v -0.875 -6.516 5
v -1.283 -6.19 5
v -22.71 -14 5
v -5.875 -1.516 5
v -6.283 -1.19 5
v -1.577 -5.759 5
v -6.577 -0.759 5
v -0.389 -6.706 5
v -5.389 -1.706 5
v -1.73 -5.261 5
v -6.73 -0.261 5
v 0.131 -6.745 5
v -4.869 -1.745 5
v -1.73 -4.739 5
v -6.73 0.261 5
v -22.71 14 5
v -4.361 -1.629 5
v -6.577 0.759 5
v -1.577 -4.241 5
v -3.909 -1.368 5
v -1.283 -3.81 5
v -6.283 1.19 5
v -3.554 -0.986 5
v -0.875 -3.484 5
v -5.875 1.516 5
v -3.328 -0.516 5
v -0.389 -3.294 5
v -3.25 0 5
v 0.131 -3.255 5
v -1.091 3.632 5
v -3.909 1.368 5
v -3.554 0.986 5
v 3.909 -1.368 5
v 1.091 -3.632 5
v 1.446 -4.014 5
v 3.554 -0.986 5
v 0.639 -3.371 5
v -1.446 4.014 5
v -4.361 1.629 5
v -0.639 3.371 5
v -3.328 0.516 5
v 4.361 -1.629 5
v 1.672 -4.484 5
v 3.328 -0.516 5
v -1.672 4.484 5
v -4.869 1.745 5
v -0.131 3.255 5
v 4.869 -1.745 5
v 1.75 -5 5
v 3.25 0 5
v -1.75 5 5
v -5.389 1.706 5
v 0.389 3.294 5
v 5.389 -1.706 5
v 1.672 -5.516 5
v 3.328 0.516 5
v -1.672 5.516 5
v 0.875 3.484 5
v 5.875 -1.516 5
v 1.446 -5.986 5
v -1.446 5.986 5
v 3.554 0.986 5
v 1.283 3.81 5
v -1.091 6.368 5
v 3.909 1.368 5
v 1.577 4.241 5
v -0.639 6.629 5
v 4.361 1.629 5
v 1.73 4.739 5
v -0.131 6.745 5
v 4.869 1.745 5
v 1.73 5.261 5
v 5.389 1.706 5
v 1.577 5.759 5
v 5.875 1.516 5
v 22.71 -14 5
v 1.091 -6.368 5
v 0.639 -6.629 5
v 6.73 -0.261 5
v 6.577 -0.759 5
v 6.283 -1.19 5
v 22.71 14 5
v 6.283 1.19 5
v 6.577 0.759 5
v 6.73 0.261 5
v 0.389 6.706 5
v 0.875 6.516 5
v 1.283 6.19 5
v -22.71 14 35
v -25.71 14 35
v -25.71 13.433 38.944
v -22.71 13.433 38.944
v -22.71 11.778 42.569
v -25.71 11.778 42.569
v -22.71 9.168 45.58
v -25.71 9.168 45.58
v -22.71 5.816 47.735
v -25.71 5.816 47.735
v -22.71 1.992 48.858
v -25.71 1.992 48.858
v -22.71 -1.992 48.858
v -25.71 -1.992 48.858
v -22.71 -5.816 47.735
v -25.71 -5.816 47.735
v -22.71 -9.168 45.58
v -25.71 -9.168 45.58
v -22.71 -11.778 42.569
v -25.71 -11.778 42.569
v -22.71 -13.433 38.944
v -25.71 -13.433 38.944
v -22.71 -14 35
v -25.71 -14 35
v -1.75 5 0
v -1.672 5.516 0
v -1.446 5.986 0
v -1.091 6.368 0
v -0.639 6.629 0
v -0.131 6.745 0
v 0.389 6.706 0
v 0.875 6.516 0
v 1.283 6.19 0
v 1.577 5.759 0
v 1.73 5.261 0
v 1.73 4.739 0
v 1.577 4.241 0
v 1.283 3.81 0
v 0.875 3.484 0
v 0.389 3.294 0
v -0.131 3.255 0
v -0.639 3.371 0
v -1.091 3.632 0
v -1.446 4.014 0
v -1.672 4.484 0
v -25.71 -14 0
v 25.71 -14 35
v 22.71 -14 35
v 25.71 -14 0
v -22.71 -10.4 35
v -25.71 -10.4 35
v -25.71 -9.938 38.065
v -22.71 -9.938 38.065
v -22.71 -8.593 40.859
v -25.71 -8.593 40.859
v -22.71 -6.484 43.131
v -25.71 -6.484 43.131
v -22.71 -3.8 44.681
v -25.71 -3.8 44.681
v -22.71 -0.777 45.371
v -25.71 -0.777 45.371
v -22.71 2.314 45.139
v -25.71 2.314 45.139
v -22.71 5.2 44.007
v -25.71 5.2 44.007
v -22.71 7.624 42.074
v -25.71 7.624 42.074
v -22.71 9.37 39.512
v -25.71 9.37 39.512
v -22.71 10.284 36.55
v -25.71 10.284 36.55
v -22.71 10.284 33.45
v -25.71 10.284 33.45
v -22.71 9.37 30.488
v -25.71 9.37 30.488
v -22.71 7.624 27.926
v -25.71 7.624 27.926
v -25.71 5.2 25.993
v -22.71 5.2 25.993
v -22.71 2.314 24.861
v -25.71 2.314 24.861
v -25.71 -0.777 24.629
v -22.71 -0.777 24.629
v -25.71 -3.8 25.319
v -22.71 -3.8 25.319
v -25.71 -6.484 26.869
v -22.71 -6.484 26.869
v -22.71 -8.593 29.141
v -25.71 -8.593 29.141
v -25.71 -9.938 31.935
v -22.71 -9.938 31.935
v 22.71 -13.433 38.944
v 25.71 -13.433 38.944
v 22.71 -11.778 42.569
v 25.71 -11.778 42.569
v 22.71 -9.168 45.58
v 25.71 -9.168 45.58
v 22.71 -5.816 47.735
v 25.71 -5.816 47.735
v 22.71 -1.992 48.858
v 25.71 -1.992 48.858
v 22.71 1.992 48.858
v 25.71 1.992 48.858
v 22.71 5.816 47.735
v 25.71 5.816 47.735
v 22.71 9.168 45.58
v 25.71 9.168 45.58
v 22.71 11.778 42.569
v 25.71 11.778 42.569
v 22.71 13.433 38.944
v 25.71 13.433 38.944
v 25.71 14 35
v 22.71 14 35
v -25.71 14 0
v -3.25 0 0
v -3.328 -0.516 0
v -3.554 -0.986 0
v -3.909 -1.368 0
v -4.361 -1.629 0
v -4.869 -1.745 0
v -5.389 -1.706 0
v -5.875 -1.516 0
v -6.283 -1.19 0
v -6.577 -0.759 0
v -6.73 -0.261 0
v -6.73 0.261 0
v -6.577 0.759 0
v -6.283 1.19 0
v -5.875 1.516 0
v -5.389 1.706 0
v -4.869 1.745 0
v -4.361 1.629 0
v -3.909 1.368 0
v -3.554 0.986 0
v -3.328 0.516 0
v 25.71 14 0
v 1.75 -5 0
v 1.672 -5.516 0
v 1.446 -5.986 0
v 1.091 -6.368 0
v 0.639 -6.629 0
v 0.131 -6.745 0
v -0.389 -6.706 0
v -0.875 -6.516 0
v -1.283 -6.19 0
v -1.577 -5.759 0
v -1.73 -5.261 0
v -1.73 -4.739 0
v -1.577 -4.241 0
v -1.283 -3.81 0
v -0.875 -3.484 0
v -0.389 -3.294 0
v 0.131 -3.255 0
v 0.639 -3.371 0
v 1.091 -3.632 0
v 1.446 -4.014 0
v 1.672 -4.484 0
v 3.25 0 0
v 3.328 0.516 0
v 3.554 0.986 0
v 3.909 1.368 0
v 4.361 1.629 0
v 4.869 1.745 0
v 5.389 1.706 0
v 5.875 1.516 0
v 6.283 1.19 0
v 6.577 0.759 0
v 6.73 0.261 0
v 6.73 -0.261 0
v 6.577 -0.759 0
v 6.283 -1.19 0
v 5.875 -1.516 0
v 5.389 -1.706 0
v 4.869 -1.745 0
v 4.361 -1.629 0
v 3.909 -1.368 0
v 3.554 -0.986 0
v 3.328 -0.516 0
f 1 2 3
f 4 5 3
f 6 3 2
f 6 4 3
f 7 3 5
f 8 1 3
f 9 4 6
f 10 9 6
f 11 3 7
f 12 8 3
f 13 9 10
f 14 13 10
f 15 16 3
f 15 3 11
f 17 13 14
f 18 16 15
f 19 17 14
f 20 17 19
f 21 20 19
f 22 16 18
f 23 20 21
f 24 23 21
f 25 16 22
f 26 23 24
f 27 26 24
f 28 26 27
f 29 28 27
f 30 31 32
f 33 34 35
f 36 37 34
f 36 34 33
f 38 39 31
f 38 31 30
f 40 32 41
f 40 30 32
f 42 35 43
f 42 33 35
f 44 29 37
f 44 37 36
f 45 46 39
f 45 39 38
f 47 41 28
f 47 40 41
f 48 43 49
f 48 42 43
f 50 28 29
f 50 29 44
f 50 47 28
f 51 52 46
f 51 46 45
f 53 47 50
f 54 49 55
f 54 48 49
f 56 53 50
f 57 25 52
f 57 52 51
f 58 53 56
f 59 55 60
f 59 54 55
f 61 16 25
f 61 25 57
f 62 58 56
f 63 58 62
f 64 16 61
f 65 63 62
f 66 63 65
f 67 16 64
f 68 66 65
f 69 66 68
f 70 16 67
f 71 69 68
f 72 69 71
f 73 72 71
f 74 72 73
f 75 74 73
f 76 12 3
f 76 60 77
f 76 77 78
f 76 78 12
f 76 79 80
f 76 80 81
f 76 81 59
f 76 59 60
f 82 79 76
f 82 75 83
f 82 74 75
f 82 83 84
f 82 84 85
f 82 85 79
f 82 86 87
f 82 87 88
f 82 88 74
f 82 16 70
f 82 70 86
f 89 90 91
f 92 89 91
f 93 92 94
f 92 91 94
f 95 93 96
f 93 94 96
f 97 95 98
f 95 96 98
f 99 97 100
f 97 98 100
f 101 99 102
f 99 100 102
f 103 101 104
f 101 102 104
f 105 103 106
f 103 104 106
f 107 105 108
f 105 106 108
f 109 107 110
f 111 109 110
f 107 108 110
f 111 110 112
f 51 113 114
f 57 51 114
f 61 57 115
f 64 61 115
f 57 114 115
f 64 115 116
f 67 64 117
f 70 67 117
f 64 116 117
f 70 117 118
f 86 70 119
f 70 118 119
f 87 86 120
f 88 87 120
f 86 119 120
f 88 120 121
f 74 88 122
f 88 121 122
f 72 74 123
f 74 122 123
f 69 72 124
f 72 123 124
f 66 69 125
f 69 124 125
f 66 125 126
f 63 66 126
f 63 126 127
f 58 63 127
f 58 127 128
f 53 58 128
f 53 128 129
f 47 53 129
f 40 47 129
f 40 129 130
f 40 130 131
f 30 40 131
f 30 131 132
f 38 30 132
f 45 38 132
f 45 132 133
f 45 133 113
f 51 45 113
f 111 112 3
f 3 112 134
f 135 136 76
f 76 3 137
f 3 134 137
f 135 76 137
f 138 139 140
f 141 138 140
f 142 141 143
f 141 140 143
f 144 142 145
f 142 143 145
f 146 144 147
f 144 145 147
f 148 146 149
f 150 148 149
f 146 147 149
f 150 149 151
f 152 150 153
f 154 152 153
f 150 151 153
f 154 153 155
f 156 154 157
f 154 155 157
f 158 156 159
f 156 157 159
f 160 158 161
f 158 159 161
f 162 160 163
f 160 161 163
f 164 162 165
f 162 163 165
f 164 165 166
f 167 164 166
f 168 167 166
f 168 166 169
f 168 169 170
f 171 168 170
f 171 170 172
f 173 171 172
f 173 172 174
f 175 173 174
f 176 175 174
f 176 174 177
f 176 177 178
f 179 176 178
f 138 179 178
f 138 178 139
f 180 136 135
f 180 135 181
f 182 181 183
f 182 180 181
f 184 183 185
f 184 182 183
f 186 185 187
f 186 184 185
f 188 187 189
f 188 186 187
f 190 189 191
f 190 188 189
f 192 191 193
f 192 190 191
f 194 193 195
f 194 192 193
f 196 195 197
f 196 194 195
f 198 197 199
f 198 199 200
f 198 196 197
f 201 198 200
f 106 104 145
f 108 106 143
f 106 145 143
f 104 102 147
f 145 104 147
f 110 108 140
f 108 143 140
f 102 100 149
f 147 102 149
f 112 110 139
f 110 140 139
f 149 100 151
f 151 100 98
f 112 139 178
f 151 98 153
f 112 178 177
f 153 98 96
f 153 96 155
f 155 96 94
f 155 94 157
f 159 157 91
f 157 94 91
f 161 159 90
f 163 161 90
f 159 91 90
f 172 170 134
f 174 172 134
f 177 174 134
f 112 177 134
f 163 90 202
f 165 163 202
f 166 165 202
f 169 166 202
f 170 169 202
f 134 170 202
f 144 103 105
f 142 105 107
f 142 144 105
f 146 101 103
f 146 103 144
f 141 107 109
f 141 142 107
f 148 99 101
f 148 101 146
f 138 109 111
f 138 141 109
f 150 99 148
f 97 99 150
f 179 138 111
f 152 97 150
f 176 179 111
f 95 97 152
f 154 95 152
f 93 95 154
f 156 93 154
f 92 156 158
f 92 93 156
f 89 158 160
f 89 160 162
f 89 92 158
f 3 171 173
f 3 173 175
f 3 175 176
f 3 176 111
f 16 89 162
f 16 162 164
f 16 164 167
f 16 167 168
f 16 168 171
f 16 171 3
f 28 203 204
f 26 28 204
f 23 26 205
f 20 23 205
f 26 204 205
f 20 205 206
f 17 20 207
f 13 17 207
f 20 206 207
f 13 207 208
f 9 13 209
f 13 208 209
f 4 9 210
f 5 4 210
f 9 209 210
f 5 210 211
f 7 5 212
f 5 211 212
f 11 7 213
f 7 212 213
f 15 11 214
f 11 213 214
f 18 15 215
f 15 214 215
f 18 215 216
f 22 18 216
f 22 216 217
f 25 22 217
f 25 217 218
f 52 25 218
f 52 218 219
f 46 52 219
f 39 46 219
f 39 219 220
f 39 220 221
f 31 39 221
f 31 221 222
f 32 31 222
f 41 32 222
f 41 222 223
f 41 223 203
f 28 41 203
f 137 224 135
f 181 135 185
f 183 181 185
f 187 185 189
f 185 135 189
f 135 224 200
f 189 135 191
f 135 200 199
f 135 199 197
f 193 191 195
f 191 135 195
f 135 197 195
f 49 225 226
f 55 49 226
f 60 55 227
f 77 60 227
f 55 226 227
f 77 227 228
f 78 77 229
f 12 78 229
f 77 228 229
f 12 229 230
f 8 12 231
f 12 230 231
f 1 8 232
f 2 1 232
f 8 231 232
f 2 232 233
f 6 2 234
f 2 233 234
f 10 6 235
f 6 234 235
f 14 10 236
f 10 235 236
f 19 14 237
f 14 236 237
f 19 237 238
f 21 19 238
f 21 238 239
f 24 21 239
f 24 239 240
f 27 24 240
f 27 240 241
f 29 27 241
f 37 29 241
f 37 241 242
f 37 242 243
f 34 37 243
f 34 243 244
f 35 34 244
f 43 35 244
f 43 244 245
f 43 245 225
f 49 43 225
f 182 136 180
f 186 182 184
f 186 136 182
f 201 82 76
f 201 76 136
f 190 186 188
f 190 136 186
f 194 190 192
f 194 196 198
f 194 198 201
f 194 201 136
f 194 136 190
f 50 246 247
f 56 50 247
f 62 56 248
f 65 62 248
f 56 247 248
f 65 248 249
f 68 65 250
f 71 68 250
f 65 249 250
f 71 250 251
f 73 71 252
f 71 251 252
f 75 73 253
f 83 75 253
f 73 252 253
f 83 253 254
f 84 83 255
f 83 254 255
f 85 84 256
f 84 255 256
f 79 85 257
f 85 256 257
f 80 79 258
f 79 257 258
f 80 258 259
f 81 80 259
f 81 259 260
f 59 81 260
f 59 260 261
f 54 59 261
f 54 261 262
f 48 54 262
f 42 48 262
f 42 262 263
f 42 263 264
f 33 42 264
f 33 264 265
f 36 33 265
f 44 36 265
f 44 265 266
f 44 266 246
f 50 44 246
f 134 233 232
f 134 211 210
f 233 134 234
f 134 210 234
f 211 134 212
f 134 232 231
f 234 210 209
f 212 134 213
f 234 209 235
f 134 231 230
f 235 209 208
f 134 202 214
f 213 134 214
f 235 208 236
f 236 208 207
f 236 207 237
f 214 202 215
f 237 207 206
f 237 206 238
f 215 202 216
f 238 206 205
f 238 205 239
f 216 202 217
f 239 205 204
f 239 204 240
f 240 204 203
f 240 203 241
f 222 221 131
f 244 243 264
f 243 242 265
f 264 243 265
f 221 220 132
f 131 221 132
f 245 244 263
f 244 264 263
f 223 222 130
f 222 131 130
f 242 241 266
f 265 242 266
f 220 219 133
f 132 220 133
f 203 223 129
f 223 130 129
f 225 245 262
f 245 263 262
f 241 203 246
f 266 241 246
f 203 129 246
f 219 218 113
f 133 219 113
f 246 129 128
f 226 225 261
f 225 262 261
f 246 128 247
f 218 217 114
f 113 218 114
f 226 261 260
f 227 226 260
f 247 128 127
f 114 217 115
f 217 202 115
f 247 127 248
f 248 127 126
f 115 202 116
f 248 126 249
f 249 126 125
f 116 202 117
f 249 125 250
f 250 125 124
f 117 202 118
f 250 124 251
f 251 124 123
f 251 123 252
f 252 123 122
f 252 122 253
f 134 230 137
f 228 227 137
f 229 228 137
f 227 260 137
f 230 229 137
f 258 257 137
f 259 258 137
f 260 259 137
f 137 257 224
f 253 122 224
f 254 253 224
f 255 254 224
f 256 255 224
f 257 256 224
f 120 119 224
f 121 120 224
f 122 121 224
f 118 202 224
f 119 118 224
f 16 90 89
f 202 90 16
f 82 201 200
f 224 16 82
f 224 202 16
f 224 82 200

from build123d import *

# Parameters (mm, degrees)
SKETCH1_W           = 51.42
SKETCH1_H           = 28
BOSS_EXTRUDE1_DEPTH = 5
SKETCH3_W           = 3
SKETCH3_H           = 28
BOSS_EXTRUDE2_DEPTH = 30
BOSS_EXTRUDE4_DEPTH = 3
SKETCH6_R           = 10.4
CUT_EXTRUDE1_DEPTH  = 4
BOSS_EXTRUDE5_START = -3
BOSS_EXTRUDE5_DEPTH = 3
SKETCH8_R           = 1.75
CUT_EXTRUDE2_DEPTH  = 10


with BuildPart() as part:
    # Sketch1 → Boss-Extrude1 (new body)
    with BuildSketch(Plane.XY):
        Rectangle(SKETCH1_W, SKETCH1_H)
    extrude(amount=BOSS_EXTRUDE1_DEPTH)

    # Sketch3 → Boss-Extrude2 (add)
    with BuildSketch(Plane.XY.offset(5)):
        with Locations((-24.21, 0)):
            Rectangle(SKETCH3_W, SKETCH3_H)
        with Locations((24.21, 0)):
            Rectangle(SKETCH3_W, SKETCH3_H)
    extrude(amount=BOSS_EXTRUDE2_DEPTH)

    # Sketch5 → Boss-Extrude4 (add)
    with BuildSketch(Plane.ZY.offset(25.71)):
        with BuildLine():
            Line((35, -14), (35, 14))
            ThreePointArc((35, 14), (49, 0), (35, -14))
        make_face()
    extrude(amount=-BOSS_EXTRUDE4_DEPTH)

    # Sketch6 → Cut-Extrude1 (cut)
    with BuildSketch(Plane.ZY.offset(25.71)):
        with Locations(Location((35, 0, 0), (0, 0, 270))):
            Circle(SKETCH6_R)
    extrude(amount=-CUT_EXTRUDE1_DEPTH, mode=Mode.SUBTRACT)

    # Sketch7 → Boss-Extrude5 (add)
    with BuildSketch(Plane(origin=(25.71, 0, 0), x_dir=(0, 0, -1), z_dir=(1, 0, 0)).offset(BOSS_EXTRUDE5_START)):
        with BuildLine():
            Line((-35, 14), (-35, -14))
            ThreePointArc((-35, -14), (-49, 0), (-35, 14))
        make_face()
    extrude(amount=BOSS_EXTRUDE5_DEPTH)

    # Sketch8 → Cut-Extrude2 (cut)
    with BuildSketch(Plane(origin=(0, 0, 0), x_dir=(-1, 0, 0), z_dir=(0, 0, -1))):
        with Locations((0, 5)):
            Circle(SKETCH8_R)
        with Locations((-5, 0)):
            Circle(SKETCH8_R)
        with Locations(Location((5, 0, 0), (0, 0, 180))):
            Circle(SKETCH8_R)
        with Locations(Location((0, -5, 0), (0, 0, 180))):
            Circle(SKETCH8_R)
    extrude(amount=-CUT_EXTRUDE2_DEPTH, mode=Mode.SUBTRACT)


solid = part.part
